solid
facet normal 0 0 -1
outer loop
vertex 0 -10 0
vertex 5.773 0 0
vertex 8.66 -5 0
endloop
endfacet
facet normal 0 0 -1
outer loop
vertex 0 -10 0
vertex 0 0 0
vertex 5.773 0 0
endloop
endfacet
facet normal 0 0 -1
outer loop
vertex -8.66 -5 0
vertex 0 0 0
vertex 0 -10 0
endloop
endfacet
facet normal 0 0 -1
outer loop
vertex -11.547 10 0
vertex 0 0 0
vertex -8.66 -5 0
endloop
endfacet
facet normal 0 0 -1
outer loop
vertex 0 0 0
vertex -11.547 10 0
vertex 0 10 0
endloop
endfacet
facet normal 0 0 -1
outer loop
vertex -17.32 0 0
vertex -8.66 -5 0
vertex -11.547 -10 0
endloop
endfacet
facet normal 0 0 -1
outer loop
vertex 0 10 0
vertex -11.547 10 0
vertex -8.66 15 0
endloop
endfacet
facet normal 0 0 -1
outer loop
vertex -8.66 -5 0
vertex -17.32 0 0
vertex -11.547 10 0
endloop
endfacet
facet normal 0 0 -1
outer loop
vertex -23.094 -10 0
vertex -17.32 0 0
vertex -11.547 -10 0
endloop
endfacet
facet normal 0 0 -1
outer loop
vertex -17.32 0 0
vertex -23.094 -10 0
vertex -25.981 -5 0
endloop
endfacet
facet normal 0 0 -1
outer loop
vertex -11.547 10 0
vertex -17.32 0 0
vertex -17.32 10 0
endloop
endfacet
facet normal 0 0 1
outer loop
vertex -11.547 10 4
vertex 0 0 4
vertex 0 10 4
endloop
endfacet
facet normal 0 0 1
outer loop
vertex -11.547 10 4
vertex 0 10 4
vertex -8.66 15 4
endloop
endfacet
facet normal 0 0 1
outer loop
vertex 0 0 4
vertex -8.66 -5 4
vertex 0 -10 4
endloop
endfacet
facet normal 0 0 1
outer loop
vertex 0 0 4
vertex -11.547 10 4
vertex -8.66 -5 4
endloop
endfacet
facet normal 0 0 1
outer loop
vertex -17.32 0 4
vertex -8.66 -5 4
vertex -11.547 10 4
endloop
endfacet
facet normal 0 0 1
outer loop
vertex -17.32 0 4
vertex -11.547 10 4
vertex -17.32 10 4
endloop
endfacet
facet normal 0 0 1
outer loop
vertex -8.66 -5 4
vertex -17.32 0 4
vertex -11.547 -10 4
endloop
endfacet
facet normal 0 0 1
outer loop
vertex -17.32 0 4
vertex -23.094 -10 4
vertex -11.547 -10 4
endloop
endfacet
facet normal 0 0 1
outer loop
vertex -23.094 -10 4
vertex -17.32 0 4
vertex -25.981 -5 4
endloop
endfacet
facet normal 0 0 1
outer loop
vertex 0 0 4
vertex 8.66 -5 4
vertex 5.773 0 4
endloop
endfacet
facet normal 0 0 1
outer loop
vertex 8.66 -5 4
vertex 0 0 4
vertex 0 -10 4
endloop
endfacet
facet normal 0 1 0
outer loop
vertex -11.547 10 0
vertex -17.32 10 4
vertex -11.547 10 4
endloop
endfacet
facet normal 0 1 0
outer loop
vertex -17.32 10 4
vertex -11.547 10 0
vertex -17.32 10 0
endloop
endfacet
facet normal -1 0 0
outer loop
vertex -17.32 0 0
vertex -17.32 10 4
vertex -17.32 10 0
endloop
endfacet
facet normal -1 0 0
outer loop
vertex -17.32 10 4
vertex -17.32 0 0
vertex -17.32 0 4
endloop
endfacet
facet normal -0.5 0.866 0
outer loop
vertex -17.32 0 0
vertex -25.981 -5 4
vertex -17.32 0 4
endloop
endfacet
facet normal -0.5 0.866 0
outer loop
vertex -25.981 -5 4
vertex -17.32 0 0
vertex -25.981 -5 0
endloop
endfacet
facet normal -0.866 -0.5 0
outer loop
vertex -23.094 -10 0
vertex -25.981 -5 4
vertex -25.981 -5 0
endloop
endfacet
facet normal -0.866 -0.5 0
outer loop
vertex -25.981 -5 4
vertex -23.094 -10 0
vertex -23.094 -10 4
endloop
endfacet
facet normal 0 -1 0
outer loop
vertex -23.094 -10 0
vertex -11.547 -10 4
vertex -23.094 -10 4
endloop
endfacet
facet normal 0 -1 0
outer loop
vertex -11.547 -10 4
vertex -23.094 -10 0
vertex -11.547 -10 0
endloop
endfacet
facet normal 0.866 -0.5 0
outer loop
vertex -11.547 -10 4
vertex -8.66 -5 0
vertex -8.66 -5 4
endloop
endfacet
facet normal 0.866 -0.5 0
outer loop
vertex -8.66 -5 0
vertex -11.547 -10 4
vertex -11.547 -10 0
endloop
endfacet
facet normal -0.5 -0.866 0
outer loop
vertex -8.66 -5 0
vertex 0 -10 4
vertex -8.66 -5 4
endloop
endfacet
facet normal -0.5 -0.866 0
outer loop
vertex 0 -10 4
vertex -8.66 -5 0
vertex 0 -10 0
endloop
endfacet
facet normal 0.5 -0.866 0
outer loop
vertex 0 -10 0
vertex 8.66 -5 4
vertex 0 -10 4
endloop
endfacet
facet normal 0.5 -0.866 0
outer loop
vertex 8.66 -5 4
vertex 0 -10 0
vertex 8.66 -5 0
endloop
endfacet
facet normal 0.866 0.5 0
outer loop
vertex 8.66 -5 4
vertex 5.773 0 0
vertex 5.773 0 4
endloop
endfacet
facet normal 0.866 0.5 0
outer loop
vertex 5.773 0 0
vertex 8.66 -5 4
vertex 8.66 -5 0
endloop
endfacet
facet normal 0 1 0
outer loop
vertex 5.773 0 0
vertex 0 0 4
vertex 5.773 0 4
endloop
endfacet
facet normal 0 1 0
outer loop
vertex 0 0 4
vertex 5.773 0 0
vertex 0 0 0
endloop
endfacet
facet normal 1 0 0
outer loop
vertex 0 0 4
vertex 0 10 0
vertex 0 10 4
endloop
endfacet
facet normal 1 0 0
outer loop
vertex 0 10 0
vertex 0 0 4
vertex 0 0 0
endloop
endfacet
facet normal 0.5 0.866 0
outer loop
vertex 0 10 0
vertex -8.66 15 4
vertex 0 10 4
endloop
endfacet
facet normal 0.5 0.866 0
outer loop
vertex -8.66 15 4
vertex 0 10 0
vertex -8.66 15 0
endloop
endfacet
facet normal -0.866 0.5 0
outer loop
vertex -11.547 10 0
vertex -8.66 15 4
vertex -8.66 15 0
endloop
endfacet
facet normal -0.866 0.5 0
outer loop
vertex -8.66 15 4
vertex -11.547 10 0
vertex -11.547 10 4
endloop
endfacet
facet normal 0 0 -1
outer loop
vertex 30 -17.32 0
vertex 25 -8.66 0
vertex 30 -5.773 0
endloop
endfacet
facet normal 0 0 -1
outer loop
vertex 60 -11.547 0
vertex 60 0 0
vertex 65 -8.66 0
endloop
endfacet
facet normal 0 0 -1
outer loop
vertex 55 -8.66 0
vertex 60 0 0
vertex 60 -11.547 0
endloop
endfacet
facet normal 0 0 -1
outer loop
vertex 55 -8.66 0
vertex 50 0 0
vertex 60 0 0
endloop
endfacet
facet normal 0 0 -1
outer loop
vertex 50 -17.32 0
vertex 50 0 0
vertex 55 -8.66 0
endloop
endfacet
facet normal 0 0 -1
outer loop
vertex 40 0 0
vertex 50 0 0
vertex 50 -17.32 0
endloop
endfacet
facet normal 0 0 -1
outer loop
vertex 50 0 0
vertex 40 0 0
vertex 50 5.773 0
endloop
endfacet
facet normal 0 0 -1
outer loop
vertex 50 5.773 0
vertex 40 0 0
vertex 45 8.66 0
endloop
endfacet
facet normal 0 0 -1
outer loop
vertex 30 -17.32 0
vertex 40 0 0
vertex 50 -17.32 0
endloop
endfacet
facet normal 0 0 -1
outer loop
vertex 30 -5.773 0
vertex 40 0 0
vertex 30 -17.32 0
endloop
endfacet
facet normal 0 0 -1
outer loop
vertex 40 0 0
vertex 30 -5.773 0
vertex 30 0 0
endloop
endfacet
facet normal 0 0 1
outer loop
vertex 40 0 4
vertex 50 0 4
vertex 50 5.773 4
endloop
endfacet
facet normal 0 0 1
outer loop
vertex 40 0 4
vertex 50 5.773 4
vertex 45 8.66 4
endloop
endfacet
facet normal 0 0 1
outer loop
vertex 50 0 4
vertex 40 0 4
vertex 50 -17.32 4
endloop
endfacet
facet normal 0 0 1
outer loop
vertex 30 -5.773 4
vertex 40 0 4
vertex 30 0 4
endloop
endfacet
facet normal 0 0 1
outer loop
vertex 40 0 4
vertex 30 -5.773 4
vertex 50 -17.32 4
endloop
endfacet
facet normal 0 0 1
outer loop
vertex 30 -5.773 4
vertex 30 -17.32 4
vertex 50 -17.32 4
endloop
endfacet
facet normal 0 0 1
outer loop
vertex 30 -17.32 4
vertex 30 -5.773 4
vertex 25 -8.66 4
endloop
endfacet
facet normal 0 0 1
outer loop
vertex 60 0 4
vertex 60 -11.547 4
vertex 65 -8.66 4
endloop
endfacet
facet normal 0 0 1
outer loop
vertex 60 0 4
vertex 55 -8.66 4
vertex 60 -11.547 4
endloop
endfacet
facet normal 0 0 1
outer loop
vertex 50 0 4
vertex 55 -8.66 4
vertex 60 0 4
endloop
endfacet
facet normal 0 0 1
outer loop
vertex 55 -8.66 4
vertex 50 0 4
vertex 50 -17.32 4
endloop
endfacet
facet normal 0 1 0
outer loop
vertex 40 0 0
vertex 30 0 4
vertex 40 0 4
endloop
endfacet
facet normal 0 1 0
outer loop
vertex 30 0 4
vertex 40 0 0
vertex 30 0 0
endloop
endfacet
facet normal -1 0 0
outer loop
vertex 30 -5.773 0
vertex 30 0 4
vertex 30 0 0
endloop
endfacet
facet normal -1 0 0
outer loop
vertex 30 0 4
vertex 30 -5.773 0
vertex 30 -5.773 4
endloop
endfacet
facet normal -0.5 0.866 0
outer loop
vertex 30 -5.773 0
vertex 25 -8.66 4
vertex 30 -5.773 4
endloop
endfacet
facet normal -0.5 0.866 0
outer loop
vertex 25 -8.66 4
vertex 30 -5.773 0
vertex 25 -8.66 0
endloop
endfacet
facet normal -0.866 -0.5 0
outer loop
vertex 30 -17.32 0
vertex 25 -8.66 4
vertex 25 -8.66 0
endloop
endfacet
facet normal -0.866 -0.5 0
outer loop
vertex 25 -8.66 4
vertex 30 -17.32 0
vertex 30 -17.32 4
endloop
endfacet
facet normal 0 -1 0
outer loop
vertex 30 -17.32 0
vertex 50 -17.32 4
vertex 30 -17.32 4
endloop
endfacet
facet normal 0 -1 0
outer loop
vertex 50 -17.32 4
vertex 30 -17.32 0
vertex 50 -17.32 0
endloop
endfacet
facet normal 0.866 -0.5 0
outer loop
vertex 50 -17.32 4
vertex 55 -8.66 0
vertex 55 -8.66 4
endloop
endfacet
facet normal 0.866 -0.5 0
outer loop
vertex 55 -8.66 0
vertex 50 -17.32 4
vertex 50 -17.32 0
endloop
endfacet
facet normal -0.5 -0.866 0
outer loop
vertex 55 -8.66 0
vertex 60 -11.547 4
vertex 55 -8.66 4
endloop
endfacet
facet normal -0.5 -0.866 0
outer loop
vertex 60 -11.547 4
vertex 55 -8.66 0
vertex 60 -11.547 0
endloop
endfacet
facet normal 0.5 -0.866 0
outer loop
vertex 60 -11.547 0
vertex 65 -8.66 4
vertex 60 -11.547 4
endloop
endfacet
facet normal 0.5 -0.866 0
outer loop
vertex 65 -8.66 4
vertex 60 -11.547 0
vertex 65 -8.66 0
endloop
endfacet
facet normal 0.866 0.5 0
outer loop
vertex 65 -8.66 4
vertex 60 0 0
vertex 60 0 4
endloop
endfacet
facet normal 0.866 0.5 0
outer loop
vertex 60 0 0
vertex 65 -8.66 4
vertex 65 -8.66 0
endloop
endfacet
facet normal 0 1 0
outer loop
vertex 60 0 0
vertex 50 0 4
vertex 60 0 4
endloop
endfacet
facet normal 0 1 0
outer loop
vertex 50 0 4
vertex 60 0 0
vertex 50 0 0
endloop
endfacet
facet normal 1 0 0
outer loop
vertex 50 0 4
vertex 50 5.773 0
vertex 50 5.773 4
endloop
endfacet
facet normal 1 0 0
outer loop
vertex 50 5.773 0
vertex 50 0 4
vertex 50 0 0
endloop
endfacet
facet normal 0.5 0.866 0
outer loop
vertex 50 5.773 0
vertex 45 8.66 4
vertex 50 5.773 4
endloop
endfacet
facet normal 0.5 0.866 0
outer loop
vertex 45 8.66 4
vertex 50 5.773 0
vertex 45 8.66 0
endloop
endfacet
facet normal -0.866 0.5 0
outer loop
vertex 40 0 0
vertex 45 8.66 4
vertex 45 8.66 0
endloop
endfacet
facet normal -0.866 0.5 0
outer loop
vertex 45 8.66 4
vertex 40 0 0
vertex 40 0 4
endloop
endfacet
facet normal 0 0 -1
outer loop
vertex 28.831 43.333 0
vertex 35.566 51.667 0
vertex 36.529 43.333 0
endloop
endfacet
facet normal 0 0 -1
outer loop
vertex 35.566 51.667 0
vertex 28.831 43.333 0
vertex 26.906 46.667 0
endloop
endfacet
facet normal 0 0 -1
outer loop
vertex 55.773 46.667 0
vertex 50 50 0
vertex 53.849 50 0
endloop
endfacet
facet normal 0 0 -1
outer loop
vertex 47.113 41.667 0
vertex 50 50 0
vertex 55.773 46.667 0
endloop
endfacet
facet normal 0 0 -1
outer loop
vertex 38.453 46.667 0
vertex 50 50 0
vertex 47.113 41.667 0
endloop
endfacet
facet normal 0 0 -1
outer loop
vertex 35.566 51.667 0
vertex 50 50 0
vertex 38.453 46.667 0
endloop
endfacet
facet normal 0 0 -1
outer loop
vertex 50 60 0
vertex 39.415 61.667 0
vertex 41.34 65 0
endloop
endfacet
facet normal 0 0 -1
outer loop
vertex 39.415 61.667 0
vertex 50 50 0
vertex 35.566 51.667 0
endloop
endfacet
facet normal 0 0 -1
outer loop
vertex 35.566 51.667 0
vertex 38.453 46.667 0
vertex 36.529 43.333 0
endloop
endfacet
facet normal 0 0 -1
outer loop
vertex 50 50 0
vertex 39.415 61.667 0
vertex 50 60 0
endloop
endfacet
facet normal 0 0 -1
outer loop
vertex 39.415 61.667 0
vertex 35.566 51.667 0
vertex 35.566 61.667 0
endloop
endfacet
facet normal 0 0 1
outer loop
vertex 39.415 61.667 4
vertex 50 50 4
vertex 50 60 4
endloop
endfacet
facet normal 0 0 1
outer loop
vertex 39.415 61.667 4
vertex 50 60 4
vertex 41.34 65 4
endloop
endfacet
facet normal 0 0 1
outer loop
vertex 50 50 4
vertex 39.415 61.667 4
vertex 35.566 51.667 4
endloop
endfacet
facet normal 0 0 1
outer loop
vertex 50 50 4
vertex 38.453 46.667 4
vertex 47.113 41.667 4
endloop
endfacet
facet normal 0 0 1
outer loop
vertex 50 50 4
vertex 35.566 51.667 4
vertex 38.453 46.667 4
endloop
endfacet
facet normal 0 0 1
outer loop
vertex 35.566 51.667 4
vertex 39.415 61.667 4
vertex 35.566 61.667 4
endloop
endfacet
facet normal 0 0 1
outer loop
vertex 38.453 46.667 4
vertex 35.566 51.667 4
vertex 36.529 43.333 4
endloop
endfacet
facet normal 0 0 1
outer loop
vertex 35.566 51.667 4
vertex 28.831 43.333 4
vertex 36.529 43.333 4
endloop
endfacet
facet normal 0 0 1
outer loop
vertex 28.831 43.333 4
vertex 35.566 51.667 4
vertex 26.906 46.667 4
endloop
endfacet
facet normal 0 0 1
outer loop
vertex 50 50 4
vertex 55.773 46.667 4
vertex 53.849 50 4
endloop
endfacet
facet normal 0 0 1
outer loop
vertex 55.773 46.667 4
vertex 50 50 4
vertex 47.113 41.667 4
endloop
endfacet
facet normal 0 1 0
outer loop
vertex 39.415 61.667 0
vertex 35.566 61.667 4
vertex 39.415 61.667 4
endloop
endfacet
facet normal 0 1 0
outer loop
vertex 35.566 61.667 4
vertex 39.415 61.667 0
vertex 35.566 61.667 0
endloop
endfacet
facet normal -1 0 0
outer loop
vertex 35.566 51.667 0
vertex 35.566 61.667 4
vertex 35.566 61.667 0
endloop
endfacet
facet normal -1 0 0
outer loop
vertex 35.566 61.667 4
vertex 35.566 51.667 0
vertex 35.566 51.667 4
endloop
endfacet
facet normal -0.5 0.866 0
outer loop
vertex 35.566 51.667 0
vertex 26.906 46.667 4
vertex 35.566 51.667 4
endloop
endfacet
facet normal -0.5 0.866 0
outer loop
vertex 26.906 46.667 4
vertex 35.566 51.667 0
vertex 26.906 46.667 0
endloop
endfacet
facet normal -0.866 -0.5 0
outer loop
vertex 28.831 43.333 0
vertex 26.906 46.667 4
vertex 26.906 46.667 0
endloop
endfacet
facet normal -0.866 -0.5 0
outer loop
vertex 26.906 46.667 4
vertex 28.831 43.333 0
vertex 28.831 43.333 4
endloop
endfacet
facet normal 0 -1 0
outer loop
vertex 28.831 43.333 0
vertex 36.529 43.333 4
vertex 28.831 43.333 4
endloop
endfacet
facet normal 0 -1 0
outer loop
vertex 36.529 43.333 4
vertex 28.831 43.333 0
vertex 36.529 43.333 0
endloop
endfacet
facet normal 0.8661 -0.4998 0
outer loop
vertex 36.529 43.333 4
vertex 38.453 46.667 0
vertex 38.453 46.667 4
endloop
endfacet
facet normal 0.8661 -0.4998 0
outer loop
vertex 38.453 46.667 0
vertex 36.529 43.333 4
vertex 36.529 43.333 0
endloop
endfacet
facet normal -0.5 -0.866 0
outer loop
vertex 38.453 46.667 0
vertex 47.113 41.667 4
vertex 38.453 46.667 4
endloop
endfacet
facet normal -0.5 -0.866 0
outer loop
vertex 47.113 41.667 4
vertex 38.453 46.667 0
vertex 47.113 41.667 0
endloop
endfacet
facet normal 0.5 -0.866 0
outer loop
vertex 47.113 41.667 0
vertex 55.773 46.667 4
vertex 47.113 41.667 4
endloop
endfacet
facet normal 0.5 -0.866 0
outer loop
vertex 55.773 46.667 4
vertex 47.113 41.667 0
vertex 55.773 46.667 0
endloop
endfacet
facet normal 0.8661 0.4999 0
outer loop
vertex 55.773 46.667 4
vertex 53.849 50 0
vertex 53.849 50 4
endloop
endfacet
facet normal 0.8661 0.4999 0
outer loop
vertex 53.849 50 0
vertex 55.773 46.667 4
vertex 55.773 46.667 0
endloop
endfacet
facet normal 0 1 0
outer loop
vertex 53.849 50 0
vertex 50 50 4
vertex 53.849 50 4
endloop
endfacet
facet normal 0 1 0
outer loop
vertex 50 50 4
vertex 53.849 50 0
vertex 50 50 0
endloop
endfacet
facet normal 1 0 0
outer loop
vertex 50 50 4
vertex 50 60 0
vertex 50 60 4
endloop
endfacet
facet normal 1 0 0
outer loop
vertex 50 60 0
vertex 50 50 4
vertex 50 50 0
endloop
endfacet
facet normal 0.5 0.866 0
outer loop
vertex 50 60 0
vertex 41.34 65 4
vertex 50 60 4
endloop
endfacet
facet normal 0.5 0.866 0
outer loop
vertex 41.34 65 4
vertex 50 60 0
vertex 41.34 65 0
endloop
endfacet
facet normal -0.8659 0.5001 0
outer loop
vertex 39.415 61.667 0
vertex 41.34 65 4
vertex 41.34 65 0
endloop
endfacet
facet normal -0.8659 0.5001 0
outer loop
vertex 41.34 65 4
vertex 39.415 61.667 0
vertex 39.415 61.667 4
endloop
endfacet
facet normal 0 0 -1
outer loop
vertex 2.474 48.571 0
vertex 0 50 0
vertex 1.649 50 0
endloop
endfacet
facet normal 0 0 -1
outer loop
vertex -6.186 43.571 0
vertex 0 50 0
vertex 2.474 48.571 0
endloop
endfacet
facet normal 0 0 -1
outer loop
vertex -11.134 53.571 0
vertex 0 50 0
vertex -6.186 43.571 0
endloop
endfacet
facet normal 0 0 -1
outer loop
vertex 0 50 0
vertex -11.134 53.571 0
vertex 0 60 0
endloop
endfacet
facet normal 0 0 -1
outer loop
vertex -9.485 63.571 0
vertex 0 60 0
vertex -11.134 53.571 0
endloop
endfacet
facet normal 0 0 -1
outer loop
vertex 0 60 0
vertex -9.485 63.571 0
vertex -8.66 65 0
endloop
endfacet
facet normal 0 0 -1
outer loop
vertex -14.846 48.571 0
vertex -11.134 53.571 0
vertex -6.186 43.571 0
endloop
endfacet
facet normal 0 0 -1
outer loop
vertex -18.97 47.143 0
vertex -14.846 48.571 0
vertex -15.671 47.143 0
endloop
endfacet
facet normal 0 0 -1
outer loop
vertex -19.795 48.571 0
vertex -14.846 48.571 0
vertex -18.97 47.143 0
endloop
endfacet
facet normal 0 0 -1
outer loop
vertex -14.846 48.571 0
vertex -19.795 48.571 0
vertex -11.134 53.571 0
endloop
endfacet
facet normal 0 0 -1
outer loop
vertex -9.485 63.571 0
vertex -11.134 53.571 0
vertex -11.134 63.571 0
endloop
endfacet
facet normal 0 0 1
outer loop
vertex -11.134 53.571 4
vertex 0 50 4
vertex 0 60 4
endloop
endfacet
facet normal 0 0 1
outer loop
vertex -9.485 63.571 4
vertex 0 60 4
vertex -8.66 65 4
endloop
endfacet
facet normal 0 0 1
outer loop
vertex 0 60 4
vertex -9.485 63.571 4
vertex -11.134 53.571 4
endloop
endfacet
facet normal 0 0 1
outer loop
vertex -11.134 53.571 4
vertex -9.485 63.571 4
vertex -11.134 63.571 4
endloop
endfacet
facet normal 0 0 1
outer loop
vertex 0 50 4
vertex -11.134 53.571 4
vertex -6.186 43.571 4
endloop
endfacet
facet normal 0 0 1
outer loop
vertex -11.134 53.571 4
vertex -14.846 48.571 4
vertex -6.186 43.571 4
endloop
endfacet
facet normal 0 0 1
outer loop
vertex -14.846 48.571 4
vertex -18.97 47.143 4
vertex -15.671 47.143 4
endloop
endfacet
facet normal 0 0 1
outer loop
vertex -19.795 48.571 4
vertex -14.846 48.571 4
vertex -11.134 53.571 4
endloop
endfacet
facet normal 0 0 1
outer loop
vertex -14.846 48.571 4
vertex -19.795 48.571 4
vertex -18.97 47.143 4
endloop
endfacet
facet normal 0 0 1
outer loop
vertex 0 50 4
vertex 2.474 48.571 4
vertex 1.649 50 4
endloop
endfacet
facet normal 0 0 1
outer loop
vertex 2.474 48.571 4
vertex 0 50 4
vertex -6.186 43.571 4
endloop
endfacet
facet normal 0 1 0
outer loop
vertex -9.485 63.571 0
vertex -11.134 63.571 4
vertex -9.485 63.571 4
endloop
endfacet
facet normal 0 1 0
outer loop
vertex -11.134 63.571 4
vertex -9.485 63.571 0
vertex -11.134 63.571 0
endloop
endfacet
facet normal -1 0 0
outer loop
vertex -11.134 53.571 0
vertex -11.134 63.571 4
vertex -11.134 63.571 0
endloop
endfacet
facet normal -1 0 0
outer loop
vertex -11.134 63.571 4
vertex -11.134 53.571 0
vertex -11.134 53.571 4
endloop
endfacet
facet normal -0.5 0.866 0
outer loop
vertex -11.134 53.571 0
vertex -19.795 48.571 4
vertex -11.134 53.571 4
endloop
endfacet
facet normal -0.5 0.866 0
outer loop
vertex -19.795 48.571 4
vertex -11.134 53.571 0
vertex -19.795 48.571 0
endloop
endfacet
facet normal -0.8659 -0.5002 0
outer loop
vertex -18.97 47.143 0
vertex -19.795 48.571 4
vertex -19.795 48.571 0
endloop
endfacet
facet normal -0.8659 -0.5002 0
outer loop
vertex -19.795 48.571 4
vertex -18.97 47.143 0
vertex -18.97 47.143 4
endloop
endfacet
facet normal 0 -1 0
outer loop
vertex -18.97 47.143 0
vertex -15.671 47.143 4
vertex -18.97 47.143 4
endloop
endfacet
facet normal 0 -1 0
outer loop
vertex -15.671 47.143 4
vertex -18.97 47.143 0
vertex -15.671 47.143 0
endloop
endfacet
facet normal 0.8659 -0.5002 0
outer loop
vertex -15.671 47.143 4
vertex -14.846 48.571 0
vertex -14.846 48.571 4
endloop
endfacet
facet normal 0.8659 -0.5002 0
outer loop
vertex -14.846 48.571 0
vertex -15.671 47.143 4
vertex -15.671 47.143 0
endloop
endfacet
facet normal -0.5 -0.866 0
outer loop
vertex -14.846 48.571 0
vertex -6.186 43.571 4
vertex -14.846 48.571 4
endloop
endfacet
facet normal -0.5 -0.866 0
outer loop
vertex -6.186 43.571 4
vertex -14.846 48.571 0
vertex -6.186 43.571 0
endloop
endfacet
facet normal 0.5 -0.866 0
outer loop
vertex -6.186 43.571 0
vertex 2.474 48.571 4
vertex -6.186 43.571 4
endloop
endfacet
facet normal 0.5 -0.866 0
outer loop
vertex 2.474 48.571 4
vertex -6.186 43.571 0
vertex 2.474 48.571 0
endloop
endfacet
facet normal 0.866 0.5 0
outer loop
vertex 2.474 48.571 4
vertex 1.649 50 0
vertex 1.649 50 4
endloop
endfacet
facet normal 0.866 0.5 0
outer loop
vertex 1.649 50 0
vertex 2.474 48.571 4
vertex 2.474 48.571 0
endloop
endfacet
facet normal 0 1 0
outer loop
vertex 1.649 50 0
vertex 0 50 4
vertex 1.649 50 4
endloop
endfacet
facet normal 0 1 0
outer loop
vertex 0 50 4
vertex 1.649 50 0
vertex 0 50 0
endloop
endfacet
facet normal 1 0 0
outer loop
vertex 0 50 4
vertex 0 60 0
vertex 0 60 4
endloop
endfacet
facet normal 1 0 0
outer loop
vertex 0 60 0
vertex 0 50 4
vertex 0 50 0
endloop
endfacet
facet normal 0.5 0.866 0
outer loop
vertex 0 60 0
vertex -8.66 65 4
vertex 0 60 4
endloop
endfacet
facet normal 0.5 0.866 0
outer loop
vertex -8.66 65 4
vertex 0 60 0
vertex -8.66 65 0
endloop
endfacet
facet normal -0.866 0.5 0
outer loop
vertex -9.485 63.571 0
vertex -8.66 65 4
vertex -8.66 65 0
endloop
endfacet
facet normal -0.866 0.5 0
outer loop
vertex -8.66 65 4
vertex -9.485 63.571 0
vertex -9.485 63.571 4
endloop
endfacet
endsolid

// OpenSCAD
//Generating a family of aperiodic monotiles
//As per the paper here: https://arxiv.org/pdf/2303.10798.pdf
//Using the tile(a,b) notation from section 6

//Angles of each side
angs = [90,180,120,30,90,0,60,330,270,210,300,240,150];
thk=4;
side=10;

//Starting from 0,0 construct the tile by adding each distance at each angle
function point(i,dsts) = [
  (i<=0)?0:(point(i-1,dsts).x+sin(angs[i])*dsts[i]),
  (i<=0)?0:(point(i-1,dsts).y+cos(angs[i])*dsts[i])
]; 
 
 module tile(a,b) {
  //Normalize the size
  x=max(a,b);
  a=a/x;
  b=b/x;
  dsts=[a,b,b,a,a,b,b,a,2*a,a,b,b,a];   //Distances
  points = [ for (i = [0:12]) point(i,dsts) ];
  linear_extrude(thk) {
    scale(side) rotate(180) polygon(points);
  }
 }
 
 //Hat
 translate([0,0,0]) tile(1,sqrt(3));
 
 //Turtle
 translate([5*side,0,0]) tile(sqrt(3),1);
 
 //Whatevers
 translate([5*side,5*side,0]) tile(1,1.5*sqrt(3));
 translate([0,5*side,0]) tile(1,3.5*sqrt(3));

 
